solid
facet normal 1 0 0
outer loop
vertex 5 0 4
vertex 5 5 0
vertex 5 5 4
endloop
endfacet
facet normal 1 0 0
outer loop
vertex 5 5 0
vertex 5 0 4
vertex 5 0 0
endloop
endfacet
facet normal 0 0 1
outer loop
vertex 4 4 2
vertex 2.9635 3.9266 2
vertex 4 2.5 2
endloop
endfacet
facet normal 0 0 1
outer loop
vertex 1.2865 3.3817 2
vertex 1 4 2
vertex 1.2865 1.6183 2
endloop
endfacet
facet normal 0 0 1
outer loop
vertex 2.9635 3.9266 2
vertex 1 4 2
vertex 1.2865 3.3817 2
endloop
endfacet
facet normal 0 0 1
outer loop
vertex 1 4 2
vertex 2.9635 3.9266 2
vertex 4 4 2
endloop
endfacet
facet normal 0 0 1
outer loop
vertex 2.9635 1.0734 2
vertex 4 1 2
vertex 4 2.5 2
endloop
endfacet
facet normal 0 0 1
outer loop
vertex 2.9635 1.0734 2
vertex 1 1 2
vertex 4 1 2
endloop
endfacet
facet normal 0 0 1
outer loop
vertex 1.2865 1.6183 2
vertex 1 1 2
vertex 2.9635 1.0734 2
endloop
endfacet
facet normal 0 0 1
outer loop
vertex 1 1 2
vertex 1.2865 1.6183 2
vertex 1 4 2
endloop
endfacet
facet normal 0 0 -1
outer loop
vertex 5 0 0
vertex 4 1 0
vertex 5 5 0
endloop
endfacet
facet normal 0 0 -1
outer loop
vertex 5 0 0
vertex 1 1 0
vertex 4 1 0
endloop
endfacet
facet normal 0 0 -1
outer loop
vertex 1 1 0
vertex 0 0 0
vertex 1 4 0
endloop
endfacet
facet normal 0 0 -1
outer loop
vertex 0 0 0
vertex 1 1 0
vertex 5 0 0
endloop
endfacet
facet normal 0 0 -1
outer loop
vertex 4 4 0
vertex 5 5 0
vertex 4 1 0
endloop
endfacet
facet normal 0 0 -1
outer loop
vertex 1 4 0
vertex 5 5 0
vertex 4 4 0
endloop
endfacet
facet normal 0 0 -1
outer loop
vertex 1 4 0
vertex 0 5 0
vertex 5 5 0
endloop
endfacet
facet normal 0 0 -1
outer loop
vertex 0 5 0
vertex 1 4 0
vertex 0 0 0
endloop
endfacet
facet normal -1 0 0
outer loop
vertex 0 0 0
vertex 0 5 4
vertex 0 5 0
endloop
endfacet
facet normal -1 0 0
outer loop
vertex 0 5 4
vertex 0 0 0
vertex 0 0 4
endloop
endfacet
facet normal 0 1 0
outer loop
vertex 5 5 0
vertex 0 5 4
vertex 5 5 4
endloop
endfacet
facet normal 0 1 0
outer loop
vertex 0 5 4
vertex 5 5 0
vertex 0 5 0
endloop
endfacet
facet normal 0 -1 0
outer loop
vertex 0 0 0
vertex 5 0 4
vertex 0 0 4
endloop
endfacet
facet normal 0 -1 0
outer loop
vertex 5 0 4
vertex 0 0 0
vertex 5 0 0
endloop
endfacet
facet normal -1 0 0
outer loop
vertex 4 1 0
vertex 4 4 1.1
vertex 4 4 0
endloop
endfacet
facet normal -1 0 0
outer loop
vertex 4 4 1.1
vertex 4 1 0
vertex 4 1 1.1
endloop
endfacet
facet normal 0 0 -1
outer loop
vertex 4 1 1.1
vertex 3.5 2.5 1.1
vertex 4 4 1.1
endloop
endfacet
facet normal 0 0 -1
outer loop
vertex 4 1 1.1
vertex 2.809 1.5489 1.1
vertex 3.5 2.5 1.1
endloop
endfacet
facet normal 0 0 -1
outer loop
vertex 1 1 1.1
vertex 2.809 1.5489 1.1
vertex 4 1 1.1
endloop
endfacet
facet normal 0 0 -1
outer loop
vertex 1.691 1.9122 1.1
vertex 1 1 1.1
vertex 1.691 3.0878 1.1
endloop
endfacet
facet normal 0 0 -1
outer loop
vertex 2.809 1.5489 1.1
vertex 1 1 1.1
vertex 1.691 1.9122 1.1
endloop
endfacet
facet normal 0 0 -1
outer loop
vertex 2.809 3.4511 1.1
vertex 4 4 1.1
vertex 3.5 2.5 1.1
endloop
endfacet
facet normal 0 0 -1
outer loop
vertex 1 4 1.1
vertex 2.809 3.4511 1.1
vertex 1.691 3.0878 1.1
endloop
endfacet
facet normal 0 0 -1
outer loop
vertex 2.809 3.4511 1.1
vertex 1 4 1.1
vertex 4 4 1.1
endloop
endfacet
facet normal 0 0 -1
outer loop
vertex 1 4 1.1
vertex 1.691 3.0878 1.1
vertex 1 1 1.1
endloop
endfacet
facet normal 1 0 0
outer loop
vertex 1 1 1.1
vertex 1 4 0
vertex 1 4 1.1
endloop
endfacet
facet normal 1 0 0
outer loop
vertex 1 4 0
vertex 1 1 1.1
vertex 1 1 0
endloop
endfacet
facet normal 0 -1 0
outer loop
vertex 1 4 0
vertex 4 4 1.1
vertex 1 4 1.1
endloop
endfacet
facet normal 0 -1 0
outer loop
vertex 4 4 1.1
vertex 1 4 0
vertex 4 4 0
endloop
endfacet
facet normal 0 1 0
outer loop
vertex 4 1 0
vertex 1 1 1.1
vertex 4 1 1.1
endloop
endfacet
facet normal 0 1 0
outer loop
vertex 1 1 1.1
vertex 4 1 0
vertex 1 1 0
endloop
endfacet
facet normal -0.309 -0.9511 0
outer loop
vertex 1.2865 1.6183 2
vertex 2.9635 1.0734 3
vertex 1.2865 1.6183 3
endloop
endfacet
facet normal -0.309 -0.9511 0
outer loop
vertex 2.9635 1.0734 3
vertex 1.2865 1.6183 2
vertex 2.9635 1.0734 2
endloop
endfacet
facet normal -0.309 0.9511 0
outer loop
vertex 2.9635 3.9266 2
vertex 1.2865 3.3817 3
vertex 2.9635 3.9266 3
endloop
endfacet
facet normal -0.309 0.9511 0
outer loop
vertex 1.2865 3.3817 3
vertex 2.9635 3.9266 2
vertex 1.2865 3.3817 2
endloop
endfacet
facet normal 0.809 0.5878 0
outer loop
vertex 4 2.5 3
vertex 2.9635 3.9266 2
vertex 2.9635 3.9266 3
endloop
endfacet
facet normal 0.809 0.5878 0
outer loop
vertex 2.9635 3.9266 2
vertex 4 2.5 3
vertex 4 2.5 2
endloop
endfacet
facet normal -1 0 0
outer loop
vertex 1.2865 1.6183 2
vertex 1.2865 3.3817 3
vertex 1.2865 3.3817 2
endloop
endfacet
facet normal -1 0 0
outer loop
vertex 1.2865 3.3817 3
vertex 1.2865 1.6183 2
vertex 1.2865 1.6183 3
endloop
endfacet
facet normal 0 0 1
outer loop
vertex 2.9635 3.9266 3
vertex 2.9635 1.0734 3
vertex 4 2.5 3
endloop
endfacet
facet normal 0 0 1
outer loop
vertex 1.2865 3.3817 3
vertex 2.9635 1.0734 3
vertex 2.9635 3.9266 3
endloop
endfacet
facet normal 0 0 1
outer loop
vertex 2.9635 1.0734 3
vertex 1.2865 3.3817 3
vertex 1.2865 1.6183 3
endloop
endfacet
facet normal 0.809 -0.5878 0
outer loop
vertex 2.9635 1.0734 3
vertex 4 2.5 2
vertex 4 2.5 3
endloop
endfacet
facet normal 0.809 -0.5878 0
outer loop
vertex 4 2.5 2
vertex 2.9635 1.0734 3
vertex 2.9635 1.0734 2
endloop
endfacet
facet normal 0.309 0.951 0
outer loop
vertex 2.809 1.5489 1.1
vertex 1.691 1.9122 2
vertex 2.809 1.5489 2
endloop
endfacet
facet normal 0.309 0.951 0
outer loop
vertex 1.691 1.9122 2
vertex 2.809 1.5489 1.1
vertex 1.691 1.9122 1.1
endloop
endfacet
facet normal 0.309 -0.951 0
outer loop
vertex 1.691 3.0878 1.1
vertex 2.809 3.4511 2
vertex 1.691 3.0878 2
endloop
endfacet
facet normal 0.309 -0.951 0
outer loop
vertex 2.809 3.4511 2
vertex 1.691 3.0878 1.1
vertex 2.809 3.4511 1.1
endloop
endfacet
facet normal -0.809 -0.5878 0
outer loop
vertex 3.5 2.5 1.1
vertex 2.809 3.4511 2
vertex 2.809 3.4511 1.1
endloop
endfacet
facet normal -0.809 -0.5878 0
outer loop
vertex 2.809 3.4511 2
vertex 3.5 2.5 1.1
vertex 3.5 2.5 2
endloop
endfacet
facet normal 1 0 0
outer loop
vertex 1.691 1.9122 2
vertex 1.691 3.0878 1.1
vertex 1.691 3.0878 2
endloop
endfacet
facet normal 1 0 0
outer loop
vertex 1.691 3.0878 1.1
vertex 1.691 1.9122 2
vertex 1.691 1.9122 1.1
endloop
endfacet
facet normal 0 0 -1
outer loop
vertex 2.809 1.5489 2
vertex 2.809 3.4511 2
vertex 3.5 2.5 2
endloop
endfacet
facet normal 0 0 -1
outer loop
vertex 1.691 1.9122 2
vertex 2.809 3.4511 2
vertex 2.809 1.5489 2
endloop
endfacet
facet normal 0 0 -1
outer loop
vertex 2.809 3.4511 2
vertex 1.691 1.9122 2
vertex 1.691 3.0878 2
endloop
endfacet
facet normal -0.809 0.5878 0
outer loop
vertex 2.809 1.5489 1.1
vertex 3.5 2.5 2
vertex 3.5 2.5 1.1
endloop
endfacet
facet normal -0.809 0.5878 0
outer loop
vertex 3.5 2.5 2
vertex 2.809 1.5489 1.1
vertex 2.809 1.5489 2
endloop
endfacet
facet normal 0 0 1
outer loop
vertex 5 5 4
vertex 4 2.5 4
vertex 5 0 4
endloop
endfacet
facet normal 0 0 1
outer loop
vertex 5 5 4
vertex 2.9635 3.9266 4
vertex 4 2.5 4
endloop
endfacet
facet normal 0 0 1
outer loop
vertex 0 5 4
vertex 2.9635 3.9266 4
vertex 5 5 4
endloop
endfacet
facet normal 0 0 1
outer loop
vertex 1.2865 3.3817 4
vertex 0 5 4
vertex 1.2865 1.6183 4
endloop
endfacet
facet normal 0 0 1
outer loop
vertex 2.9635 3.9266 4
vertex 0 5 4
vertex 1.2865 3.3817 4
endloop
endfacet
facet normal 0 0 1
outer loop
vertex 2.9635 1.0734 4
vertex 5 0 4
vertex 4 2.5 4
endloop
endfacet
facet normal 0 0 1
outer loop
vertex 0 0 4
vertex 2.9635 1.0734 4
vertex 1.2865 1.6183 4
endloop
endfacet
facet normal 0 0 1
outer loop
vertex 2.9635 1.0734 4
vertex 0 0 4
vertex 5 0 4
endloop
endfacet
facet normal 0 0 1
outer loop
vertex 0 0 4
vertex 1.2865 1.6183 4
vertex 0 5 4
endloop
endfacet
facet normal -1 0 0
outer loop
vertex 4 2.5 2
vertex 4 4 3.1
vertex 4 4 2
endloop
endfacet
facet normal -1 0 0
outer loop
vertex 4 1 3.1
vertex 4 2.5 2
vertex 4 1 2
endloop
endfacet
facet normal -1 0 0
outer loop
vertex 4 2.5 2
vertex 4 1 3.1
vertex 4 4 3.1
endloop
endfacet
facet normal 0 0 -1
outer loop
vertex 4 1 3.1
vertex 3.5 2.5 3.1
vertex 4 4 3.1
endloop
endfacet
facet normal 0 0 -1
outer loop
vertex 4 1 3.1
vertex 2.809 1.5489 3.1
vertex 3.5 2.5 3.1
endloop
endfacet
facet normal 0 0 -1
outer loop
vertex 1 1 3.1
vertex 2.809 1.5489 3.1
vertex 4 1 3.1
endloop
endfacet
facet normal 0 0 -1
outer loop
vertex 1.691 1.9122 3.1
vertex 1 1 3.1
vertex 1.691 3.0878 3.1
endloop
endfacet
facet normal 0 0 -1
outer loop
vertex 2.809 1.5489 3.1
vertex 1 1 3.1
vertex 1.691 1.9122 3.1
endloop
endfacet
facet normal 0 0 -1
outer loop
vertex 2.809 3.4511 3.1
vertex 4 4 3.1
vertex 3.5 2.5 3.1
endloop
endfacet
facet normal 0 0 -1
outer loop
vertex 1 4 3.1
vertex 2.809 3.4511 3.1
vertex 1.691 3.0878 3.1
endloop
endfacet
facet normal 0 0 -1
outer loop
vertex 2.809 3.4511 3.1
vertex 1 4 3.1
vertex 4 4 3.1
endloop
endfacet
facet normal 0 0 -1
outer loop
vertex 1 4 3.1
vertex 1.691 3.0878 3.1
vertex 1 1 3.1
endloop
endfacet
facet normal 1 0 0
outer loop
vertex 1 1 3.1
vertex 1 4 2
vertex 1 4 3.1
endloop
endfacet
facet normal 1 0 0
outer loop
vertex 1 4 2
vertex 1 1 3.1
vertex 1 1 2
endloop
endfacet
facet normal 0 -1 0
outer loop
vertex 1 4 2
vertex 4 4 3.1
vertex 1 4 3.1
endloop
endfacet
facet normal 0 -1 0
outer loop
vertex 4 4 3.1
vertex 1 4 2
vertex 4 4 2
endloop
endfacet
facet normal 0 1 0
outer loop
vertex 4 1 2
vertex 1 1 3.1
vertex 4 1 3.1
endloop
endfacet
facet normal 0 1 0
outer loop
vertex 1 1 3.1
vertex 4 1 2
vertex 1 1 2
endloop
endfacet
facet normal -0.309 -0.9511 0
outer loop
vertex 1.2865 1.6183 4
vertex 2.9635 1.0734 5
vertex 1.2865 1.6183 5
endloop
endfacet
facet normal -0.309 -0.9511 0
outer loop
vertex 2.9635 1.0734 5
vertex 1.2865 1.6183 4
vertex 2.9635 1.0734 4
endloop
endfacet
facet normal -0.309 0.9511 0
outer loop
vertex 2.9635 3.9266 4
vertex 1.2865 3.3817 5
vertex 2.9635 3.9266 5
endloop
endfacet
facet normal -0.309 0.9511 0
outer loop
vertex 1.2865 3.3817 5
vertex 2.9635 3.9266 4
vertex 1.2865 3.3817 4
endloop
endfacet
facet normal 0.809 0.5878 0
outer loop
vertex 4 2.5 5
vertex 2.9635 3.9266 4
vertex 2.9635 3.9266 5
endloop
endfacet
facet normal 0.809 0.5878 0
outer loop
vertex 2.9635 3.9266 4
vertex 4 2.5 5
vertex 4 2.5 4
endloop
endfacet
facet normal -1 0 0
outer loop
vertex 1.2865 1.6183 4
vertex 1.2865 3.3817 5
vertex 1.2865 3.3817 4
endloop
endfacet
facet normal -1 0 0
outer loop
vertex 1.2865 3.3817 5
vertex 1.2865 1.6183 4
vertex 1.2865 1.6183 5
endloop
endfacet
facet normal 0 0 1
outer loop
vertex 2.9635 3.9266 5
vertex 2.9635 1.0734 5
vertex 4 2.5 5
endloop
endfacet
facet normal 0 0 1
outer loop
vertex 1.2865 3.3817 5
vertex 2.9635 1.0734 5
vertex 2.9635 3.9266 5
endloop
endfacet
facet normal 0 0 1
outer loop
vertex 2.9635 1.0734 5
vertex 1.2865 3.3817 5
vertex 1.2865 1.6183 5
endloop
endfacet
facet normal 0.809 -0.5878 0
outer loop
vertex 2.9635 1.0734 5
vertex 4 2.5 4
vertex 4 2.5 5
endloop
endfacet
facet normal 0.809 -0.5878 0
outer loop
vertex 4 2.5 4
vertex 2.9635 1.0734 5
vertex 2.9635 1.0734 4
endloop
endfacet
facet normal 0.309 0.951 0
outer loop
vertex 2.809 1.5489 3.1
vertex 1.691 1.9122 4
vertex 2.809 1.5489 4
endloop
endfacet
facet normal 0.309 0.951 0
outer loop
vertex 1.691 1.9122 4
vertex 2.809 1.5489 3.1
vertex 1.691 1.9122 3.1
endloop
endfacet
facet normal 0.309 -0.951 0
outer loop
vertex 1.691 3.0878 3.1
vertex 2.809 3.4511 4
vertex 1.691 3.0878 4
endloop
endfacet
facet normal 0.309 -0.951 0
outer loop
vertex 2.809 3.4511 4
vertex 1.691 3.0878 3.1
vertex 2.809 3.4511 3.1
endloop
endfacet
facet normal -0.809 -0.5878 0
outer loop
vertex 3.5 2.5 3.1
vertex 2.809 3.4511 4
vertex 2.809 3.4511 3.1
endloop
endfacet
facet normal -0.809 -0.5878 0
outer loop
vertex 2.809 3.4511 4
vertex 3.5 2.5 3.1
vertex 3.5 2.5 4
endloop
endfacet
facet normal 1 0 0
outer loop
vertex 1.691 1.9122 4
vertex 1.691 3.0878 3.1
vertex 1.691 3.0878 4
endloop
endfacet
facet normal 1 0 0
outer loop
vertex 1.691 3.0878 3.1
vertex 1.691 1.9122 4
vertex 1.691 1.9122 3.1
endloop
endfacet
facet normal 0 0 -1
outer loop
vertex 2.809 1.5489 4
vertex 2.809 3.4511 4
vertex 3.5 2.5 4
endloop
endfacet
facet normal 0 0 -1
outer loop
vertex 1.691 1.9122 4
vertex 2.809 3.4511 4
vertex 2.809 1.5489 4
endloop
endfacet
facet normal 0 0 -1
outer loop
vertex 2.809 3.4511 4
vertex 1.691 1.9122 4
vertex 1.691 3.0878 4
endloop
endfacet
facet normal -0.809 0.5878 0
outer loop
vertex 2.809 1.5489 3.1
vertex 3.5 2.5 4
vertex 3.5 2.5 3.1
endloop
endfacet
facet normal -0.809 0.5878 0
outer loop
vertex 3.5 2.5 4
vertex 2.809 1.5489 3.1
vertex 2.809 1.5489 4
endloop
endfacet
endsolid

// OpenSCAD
ldd = 1;

//all these in ldu's
stud_out_diam = 3.0;
stud_in_diam = 2;
stud_height = 1;
pin_diam = 3.0;
pin_rim_diam = 3.5;
brick_width = 5.0;
brick_height = 6.0;
plate_height = 2.0;
skin_width = 1.0;
white = [1,1,1];
trans_red = [1,0,0, 0.2];

module closed_stud() {
	//outer cylinder
	cylinder( h = stud_height, r = stud_out_diam /2);
}

module open_stud() {
	difference () {
		closed_stud();
		//inner cylinder
		cylinder( h = stud_height, r = stud_in_diam /2);
	}
}

module plate1by1() {
	inner_width = brick_width - (skin_width * 2);
	half_width = brick_width / 2;
	difference() {
		union() {
			difference() {
				cube(size = [brick_width, brick_width, plate_height]);
				translate(v = [skin_width, skin_width, -0.1]) {
					cube(size = [inner_width, inner_width, 
				 		plate_height - skin_width + 0.2]);
				}
			}
			translate(v = [half_width, half_width, plate_height]) {
				closed_stud();
			}
		}
		translate(v=[half_width, half_width, plate_height - skin_width]) {
			cylinder( h = skin_width, r = skin_width );
		}
	}
}

scale(ldd) {
	color(trans_red) plate1by1();
	translate(v=[0, 0, plate_height]) {
		color(white)
		plate1by1();
	}
}
